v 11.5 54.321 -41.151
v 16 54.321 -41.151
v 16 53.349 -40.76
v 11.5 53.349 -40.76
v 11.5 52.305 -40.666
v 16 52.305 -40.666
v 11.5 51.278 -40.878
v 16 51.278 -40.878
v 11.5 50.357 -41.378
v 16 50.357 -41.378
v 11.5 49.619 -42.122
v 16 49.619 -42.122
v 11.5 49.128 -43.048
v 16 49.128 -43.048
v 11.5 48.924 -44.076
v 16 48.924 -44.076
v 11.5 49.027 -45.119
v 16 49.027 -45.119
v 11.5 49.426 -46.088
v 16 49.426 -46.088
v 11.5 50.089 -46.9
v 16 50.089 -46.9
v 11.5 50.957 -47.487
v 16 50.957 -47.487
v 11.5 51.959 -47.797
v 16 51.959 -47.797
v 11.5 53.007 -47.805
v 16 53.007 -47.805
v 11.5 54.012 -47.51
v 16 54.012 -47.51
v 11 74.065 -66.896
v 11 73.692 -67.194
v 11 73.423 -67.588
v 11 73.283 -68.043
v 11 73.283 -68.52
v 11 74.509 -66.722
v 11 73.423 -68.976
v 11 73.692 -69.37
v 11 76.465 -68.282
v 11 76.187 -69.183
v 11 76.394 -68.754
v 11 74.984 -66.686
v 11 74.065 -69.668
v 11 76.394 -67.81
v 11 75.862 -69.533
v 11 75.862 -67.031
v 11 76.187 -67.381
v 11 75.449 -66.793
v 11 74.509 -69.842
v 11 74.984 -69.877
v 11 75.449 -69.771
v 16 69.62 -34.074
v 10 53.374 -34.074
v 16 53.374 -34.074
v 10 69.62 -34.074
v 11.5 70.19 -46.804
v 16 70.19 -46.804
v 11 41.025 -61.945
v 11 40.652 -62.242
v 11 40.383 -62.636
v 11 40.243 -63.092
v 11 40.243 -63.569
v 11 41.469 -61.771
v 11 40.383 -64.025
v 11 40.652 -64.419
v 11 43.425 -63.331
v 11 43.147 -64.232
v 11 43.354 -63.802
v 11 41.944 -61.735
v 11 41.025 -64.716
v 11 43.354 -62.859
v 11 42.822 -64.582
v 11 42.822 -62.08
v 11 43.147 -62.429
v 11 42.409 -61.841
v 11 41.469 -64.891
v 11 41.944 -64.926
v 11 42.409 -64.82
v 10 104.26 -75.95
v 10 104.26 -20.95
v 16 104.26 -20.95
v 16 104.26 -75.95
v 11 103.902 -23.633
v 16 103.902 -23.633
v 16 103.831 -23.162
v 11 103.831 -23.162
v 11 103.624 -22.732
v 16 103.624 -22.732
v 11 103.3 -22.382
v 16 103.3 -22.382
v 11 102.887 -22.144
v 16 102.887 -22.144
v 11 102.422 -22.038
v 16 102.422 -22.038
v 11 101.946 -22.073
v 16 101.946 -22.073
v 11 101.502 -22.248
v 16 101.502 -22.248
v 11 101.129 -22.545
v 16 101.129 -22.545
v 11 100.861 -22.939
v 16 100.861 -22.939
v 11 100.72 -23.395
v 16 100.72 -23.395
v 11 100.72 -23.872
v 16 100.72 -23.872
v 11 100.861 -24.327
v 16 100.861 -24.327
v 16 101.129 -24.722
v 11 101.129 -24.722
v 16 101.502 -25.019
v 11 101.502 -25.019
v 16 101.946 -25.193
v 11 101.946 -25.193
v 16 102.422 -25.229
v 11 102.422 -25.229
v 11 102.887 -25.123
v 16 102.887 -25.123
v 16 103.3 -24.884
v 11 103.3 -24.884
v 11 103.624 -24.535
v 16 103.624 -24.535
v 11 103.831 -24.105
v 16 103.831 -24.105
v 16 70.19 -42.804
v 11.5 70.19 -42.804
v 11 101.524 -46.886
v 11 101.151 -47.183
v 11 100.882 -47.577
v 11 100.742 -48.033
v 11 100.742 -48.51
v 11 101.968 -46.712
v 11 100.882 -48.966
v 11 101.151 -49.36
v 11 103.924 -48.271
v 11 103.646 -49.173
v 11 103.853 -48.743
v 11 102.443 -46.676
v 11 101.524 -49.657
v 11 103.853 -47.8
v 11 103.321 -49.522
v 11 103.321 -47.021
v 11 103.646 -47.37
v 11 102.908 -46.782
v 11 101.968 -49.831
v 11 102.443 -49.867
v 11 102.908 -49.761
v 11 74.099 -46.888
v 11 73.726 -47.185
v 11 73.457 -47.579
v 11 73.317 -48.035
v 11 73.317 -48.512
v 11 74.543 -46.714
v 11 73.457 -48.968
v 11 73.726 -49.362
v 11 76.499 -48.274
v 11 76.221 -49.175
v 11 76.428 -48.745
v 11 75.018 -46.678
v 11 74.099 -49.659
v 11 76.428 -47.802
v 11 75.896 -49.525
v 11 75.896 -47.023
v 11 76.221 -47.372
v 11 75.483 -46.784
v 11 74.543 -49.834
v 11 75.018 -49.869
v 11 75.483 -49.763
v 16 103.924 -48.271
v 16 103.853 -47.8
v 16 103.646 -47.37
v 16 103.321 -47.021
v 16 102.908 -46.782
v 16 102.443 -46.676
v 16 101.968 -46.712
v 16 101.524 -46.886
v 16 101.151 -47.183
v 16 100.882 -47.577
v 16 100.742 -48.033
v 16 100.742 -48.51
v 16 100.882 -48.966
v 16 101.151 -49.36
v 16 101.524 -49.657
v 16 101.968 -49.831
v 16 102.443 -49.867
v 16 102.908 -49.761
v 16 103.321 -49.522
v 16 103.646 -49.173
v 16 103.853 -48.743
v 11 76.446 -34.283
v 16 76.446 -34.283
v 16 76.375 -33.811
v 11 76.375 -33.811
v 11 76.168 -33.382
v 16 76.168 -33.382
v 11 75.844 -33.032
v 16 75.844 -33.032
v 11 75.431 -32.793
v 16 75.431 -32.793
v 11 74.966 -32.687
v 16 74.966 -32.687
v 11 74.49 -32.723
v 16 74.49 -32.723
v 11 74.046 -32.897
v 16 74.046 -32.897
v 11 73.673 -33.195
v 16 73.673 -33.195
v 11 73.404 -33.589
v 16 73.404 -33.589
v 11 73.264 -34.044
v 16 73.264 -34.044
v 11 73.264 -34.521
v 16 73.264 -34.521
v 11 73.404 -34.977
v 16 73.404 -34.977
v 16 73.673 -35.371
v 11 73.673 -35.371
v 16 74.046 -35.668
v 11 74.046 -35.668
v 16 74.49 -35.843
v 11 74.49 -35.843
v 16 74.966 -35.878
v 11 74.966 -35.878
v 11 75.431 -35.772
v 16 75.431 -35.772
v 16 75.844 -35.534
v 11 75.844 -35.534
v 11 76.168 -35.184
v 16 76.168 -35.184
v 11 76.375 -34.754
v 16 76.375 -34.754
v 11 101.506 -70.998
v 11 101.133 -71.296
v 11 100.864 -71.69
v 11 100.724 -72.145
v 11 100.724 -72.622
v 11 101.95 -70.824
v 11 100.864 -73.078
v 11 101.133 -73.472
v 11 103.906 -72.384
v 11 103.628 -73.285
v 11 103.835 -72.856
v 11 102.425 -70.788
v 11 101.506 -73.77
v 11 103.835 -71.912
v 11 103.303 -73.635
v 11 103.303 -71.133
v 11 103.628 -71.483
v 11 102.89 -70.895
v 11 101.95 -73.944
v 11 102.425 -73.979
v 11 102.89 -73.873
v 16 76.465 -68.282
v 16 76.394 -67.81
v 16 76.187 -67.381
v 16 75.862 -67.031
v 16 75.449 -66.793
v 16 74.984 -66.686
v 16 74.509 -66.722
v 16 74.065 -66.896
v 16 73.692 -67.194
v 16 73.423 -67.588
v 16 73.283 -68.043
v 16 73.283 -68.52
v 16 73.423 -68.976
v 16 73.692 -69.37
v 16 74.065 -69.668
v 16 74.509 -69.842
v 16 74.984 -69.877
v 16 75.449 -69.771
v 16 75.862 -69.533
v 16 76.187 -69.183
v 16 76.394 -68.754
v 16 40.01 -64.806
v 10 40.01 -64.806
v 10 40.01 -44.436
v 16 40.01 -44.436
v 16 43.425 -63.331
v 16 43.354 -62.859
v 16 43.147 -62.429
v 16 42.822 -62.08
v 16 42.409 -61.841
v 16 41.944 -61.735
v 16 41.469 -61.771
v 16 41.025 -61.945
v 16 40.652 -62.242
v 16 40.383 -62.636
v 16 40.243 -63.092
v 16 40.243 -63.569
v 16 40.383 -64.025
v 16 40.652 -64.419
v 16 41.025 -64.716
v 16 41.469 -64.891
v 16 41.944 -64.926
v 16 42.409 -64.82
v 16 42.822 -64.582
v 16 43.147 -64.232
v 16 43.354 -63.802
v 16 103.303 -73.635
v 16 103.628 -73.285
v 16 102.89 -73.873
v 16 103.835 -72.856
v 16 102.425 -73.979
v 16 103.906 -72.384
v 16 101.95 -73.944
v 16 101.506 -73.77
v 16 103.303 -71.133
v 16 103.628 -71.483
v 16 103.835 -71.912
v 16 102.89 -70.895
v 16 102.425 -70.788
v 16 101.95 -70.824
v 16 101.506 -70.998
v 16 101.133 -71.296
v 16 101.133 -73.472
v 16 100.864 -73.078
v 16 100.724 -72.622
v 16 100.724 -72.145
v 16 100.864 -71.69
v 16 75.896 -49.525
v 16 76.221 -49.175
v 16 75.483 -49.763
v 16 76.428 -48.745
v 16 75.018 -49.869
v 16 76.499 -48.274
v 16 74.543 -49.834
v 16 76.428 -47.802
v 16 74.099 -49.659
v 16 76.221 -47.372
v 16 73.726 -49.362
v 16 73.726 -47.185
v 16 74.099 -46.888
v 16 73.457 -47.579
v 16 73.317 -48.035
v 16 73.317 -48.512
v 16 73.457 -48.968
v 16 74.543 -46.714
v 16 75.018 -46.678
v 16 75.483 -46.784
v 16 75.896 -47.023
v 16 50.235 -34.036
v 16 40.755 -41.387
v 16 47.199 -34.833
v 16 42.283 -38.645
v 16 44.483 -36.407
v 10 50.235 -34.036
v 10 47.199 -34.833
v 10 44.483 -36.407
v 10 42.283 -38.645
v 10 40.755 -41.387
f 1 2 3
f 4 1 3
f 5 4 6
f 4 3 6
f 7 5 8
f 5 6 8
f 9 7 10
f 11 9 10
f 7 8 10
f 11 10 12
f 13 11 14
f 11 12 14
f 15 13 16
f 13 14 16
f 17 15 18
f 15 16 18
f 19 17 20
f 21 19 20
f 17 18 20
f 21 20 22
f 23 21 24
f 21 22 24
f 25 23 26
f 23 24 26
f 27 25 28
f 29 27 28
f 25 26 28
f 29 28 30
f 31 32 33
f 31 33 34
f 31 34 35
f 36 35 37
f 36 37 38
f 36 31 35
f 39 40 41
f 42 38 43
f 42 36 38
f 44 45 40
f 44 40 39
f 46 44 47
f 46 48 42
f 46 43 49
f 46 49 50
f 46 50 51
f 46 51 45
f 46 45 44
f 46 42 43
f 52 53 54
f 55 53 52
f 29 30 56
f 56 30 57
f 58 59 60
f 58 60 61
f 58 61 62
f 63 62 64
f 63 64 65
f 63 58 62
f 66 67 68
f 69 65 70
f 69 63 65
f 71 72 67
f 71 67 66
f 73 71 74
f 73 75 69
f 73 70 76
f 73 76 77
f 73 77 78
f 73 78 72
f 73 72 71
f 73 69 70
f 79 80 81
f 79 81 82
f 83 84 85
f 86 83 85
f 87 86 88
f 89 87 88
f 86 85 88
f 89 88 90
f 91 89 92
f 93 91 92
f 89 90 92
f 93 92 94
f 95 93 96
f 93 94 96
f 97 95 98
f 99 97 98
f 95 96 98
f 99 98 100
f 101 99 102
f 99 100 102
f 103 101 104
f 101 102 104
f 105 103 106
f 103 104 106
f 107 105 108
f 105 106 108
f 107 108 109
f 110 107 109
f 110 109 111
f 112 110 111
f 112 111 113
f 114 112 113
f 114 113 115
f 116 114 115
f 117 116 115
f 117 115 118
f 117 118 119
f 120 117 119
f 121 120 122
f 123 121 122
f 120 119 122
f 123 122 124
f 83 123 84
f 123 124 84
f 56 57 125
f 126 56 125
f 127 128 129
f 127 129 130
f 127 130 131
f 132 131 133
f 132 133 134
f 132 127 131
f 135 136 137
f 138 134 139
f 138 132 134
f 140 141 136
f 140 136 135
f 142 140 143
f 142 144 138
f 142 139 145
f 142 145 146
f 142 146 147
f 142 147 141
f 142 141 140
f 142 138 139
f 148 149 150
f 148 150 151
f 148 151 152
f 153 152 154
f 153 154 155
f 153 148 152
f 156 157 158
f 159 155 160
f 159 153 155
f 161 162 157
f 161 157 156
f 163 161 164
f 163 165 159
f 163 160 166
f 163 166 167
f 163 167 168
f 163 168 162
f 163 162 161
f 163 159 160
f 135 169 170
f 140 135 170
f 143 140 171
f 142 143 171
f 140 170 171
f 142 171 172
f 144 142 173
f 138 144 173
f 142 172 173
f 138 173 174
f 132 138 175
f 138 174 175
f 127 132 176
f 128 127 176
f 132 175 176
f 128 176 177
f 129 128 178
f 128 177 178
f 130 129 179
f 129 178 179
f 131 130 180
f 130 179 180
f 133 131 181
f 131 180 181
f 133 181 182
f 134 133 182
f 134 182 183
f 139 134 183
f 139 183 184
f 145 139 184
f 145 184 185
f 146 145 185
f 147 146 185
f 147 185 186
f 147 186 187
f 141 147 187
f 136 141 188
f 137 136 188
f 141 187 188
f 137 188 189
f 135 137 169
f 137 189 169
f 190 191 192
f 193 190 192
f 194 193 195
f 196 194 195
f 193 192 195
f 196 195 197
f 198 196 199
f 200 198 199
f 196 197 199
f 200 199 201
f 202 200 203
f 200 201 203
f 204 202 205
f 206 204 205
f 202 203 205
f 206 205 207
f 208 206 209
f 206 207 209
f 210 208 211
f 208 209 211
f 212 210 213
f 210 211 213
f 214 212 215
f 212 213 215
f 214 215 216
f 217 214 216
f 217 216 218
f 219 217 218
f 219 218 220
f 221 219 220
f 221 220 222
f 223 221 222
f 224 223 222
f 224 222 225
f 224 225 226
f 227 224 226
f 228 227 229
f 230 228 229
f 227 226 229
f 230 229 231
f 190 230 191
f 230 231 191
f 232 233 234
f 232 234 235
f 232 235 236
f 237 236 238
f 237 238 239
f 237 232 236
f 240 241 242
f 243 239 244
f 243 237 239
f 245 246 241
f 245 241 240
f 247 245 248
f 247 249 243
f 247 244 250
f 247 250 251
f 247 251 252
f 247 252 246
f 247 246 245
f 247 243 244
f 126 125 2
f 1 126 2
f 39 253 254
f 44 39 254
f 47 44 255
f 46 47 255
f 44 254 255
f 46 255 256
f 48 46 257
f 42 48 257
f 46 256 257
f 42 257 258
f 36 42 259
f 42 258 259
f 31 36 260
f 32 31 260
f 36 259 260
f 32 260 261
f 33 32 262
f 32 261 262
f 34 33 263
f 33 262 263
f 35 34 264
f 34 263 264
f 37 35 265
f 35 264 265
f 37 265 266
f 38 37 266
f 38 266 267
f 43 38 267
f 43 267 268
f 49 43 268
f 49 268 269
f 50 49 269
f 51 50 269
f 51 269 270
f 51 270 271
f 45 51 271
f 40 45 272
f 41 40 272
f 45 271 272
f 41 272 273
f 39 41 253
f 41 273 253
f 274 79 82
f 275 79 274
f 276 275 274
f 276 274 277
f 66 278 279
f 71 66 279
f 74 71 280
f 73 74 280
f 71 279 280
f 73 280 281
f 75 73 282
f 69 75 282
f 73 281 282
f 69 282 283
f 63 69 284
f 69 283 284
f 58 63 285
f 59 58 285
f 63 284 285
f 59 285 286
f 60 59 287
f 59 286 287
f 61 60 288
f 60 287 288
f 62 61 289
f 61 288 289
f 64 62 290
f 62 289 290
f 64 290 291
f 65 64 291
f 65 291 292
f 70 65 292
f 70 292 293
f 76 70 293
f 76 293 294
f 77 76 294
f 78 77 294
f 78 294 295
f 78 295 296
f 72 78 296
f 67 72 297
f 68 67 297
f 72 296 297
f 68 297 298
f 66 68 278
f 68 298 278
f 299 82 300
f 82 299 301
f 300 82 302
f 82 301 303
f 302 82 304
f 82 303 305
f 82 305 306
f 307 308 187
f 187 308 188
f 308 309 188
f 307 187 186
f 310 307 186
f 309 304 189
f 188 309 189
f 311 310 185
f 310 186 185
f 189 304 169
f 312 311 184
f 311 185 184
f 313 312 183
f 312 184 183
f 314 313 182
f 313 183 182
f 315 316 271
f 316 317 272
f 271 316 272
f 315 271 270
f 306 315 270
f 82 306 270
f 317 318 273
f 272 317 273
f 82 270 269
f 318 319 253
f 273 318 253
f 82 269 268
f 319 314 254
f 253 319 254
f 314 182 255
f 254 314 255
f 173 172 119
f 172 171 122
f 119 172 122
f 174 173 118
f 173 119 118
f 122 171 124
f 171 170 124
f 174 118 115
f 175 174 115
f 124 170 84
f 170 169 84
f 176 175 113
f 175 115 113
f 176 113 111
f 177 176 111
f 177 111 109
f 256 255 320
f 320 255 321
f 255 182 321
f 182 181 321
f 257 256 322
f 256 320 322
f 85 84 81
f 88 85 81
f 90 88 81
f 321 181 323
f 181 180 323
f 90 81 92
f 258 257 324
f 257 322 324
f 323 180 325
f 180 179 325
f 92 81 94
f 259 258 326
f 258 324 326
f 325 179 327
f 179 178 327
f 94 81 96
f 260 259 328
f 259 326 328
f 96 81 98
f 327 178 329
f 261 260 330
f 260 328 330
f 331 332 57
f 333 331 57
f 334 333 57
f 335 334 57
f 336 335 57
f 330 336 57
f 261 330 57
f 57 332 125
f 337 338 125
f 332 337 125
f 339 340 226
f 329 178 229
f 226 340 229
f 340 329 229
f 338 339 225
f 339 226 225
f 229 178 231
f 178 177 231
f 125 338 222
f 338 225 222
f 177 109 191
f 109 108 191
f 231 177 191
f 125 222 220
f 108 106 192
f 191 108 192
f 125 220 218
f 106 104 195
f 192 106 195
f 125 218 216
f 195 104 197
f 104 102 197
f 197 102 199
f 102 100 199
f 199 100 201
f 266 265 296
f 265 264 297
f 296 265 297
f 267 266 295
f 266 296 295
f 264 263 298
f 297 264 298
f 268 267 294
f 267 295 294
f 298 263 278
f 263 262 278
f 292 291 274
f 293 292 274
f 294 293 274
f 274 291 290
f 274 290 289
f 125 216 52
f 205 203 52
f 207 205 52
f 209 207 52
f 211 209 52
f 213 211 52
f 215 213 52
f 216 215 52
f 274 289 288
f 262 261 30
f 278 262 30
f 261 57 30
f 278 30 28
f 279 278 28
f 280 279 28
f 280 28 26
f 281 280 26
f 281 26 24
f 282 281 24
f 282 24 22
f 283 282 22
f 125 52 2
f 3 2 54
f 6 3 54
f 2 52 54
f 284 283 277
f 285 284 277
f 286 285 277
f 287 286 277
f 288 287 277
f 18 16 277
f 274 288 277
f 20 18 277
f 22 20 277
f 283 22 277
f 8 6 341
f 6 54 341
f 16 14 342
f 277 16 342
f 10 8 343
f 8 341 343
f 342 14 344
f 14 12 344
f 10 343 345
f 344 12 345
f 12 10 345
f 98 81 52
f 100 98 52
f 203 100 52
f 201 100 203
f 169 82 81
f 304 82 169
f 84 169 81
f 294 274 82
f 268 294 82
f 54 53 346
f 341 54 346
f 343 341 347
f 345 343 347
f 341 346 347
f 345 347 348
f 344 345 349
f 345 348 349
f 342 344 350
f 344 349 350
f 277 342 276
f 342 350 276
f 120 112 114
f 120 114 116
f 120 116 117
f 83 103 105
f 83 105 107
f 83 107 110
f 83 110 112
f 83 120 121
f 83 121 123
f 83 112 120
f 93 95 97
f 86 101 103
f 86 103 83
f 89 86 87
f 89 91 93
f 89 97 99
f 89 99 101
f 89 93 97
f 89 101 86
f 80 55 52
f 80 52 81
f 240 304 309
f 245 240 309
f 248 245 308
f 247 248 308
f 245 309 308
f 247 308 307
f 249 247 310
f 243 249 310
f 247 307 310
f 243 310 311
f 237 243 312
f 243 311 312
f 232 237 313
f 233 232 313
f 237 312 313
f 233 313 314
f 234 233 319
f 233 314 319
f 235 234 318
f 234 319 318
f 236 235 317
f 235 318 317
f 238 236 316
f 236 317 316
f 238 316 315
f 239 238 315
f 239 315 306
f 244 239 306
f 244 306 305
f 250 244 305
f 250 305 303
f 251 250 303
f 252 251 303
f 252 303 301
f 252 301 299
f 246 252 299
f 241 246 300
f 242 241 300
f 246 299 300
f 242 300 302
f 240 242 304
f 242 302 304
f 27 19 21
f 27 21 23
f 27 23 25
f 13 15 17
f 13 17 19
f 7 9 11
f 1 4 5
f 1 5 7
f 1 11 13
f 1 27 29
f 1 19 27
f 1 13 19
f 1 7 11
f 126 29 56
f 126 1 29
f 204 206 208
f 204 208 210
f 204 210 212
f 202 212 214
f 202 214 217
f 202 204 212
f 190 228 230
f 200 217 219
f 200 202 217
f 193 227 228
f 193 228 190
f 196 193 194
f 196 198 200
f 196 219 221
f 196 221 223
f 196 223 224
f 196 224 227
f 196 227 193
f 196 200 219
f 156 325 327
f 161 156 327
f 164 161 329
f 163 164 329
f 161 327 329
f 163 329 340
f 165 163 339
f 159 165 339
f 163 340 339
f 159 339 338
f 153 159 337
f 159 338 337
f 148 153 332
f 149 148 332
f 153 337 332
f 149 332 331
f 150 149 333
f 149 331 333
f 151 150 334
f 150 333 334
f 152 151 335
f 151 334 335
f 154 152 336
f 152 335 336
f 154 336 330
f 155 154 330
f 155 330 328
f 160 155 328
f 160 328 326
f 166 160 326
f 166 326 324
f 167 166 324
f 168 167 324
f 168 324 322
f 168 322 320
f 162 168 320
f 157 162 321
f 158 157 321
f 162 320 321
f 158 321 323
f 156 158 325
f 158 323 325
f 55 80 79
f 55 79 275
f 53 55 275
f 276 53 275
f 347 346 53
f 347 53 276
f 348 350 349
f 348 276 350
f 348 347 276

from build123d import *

# Parameters (mm, degrees)
PAD011_DEPTH         = 6
POCKET011_DEPTH      = 4.5
POCKET011_DEPTH_BACK = 100
SKETCH030_R          = 1.6
POCKET013_DEPTH      = 5


with BuildPart() as part:
    # CopySketch028 → Pad011 (new body)
    with BuildSketch(Plane.YZ):
        with BuildLine():
            Line((69.62, -34.0739220052), (104.26, -20.95))
            Line((104.26, -20.95), (104.26, -75.95))
            Line((104.26, -75.95), (40.01, -64.8058991482))
            Line((40.01, -64.8058991482), (40.01, -44.4358991482))
            ThreePointArc((53.3737933734, -34.0739220052), (44.4834146169, -36.4066415985), (40.01, -44.4358991482))
            Line((53.3737933734, -34.0739220052), (69.62, -34.0739220052))
        make_face()
    extrude(amount=PAD011_DEPTH)

    # Sketch028 → Pocket011 (cut, two sides)
    with BuildSketch(Plane.YZ.offset(6)) as pocket011_sk:
        with BuildLine():
            ThreePointArc((54.3211015793, -41.1506327381), (48.924493396, -44.0759059246), (54.0123107229, -47.5102498135))
            Line((54.0123107229, -47.5102498135), (70.19, -46.8041455781))
            Line((70.19, -46.8041455781), (70.19, -42.8041455781))
            Line((70.19, -42.8041455781), (54.3211015793, -41.1506327381))
        make_face()
    extrude(amount=-POCKET011_DEPTH, mode=Mode.SUBTRACT)
    extrude(pocket011_sk.sketch, amount=POCKET011_DEPTH_BACK, mode=Mode.SUBTRACT)

    # Sketch030 (on Face5 of Pocket011) → Pocket013 (cut)
    with BuildSketch(Plane.YZ.offset(6)):
        with Locations((74.898643, -48.273617)):
            Circle(SKETCH030_R)
        with Locations((74.845955, -34.282856)):
            Circle(SKETCH030_R)
        with Locations((102.302101, -23.633244)):
            Circle(SKETCH030_R)
        with Locations((102.323669, -48.271477)):
            Circle(SKETCH030_R)
        with Locations((102.305855, -72.383957)):
            Circle(SKETCH030_R)
        with Locations((74.864891, -68.281929)):
            Circle(SKETCH030_R)
        with Locations((41.8248800985, -63.330712397)):
            Circle(SKETCH030_R)
    extrude(amount=-POCKET013_DEPTH, mode=Mode.SUBTRACT)


with BuildPart() as part_1:
    # Body004 placement: moved
    add(part.part.moved(Location((10, 0, 0))))


solid = part_1.part
